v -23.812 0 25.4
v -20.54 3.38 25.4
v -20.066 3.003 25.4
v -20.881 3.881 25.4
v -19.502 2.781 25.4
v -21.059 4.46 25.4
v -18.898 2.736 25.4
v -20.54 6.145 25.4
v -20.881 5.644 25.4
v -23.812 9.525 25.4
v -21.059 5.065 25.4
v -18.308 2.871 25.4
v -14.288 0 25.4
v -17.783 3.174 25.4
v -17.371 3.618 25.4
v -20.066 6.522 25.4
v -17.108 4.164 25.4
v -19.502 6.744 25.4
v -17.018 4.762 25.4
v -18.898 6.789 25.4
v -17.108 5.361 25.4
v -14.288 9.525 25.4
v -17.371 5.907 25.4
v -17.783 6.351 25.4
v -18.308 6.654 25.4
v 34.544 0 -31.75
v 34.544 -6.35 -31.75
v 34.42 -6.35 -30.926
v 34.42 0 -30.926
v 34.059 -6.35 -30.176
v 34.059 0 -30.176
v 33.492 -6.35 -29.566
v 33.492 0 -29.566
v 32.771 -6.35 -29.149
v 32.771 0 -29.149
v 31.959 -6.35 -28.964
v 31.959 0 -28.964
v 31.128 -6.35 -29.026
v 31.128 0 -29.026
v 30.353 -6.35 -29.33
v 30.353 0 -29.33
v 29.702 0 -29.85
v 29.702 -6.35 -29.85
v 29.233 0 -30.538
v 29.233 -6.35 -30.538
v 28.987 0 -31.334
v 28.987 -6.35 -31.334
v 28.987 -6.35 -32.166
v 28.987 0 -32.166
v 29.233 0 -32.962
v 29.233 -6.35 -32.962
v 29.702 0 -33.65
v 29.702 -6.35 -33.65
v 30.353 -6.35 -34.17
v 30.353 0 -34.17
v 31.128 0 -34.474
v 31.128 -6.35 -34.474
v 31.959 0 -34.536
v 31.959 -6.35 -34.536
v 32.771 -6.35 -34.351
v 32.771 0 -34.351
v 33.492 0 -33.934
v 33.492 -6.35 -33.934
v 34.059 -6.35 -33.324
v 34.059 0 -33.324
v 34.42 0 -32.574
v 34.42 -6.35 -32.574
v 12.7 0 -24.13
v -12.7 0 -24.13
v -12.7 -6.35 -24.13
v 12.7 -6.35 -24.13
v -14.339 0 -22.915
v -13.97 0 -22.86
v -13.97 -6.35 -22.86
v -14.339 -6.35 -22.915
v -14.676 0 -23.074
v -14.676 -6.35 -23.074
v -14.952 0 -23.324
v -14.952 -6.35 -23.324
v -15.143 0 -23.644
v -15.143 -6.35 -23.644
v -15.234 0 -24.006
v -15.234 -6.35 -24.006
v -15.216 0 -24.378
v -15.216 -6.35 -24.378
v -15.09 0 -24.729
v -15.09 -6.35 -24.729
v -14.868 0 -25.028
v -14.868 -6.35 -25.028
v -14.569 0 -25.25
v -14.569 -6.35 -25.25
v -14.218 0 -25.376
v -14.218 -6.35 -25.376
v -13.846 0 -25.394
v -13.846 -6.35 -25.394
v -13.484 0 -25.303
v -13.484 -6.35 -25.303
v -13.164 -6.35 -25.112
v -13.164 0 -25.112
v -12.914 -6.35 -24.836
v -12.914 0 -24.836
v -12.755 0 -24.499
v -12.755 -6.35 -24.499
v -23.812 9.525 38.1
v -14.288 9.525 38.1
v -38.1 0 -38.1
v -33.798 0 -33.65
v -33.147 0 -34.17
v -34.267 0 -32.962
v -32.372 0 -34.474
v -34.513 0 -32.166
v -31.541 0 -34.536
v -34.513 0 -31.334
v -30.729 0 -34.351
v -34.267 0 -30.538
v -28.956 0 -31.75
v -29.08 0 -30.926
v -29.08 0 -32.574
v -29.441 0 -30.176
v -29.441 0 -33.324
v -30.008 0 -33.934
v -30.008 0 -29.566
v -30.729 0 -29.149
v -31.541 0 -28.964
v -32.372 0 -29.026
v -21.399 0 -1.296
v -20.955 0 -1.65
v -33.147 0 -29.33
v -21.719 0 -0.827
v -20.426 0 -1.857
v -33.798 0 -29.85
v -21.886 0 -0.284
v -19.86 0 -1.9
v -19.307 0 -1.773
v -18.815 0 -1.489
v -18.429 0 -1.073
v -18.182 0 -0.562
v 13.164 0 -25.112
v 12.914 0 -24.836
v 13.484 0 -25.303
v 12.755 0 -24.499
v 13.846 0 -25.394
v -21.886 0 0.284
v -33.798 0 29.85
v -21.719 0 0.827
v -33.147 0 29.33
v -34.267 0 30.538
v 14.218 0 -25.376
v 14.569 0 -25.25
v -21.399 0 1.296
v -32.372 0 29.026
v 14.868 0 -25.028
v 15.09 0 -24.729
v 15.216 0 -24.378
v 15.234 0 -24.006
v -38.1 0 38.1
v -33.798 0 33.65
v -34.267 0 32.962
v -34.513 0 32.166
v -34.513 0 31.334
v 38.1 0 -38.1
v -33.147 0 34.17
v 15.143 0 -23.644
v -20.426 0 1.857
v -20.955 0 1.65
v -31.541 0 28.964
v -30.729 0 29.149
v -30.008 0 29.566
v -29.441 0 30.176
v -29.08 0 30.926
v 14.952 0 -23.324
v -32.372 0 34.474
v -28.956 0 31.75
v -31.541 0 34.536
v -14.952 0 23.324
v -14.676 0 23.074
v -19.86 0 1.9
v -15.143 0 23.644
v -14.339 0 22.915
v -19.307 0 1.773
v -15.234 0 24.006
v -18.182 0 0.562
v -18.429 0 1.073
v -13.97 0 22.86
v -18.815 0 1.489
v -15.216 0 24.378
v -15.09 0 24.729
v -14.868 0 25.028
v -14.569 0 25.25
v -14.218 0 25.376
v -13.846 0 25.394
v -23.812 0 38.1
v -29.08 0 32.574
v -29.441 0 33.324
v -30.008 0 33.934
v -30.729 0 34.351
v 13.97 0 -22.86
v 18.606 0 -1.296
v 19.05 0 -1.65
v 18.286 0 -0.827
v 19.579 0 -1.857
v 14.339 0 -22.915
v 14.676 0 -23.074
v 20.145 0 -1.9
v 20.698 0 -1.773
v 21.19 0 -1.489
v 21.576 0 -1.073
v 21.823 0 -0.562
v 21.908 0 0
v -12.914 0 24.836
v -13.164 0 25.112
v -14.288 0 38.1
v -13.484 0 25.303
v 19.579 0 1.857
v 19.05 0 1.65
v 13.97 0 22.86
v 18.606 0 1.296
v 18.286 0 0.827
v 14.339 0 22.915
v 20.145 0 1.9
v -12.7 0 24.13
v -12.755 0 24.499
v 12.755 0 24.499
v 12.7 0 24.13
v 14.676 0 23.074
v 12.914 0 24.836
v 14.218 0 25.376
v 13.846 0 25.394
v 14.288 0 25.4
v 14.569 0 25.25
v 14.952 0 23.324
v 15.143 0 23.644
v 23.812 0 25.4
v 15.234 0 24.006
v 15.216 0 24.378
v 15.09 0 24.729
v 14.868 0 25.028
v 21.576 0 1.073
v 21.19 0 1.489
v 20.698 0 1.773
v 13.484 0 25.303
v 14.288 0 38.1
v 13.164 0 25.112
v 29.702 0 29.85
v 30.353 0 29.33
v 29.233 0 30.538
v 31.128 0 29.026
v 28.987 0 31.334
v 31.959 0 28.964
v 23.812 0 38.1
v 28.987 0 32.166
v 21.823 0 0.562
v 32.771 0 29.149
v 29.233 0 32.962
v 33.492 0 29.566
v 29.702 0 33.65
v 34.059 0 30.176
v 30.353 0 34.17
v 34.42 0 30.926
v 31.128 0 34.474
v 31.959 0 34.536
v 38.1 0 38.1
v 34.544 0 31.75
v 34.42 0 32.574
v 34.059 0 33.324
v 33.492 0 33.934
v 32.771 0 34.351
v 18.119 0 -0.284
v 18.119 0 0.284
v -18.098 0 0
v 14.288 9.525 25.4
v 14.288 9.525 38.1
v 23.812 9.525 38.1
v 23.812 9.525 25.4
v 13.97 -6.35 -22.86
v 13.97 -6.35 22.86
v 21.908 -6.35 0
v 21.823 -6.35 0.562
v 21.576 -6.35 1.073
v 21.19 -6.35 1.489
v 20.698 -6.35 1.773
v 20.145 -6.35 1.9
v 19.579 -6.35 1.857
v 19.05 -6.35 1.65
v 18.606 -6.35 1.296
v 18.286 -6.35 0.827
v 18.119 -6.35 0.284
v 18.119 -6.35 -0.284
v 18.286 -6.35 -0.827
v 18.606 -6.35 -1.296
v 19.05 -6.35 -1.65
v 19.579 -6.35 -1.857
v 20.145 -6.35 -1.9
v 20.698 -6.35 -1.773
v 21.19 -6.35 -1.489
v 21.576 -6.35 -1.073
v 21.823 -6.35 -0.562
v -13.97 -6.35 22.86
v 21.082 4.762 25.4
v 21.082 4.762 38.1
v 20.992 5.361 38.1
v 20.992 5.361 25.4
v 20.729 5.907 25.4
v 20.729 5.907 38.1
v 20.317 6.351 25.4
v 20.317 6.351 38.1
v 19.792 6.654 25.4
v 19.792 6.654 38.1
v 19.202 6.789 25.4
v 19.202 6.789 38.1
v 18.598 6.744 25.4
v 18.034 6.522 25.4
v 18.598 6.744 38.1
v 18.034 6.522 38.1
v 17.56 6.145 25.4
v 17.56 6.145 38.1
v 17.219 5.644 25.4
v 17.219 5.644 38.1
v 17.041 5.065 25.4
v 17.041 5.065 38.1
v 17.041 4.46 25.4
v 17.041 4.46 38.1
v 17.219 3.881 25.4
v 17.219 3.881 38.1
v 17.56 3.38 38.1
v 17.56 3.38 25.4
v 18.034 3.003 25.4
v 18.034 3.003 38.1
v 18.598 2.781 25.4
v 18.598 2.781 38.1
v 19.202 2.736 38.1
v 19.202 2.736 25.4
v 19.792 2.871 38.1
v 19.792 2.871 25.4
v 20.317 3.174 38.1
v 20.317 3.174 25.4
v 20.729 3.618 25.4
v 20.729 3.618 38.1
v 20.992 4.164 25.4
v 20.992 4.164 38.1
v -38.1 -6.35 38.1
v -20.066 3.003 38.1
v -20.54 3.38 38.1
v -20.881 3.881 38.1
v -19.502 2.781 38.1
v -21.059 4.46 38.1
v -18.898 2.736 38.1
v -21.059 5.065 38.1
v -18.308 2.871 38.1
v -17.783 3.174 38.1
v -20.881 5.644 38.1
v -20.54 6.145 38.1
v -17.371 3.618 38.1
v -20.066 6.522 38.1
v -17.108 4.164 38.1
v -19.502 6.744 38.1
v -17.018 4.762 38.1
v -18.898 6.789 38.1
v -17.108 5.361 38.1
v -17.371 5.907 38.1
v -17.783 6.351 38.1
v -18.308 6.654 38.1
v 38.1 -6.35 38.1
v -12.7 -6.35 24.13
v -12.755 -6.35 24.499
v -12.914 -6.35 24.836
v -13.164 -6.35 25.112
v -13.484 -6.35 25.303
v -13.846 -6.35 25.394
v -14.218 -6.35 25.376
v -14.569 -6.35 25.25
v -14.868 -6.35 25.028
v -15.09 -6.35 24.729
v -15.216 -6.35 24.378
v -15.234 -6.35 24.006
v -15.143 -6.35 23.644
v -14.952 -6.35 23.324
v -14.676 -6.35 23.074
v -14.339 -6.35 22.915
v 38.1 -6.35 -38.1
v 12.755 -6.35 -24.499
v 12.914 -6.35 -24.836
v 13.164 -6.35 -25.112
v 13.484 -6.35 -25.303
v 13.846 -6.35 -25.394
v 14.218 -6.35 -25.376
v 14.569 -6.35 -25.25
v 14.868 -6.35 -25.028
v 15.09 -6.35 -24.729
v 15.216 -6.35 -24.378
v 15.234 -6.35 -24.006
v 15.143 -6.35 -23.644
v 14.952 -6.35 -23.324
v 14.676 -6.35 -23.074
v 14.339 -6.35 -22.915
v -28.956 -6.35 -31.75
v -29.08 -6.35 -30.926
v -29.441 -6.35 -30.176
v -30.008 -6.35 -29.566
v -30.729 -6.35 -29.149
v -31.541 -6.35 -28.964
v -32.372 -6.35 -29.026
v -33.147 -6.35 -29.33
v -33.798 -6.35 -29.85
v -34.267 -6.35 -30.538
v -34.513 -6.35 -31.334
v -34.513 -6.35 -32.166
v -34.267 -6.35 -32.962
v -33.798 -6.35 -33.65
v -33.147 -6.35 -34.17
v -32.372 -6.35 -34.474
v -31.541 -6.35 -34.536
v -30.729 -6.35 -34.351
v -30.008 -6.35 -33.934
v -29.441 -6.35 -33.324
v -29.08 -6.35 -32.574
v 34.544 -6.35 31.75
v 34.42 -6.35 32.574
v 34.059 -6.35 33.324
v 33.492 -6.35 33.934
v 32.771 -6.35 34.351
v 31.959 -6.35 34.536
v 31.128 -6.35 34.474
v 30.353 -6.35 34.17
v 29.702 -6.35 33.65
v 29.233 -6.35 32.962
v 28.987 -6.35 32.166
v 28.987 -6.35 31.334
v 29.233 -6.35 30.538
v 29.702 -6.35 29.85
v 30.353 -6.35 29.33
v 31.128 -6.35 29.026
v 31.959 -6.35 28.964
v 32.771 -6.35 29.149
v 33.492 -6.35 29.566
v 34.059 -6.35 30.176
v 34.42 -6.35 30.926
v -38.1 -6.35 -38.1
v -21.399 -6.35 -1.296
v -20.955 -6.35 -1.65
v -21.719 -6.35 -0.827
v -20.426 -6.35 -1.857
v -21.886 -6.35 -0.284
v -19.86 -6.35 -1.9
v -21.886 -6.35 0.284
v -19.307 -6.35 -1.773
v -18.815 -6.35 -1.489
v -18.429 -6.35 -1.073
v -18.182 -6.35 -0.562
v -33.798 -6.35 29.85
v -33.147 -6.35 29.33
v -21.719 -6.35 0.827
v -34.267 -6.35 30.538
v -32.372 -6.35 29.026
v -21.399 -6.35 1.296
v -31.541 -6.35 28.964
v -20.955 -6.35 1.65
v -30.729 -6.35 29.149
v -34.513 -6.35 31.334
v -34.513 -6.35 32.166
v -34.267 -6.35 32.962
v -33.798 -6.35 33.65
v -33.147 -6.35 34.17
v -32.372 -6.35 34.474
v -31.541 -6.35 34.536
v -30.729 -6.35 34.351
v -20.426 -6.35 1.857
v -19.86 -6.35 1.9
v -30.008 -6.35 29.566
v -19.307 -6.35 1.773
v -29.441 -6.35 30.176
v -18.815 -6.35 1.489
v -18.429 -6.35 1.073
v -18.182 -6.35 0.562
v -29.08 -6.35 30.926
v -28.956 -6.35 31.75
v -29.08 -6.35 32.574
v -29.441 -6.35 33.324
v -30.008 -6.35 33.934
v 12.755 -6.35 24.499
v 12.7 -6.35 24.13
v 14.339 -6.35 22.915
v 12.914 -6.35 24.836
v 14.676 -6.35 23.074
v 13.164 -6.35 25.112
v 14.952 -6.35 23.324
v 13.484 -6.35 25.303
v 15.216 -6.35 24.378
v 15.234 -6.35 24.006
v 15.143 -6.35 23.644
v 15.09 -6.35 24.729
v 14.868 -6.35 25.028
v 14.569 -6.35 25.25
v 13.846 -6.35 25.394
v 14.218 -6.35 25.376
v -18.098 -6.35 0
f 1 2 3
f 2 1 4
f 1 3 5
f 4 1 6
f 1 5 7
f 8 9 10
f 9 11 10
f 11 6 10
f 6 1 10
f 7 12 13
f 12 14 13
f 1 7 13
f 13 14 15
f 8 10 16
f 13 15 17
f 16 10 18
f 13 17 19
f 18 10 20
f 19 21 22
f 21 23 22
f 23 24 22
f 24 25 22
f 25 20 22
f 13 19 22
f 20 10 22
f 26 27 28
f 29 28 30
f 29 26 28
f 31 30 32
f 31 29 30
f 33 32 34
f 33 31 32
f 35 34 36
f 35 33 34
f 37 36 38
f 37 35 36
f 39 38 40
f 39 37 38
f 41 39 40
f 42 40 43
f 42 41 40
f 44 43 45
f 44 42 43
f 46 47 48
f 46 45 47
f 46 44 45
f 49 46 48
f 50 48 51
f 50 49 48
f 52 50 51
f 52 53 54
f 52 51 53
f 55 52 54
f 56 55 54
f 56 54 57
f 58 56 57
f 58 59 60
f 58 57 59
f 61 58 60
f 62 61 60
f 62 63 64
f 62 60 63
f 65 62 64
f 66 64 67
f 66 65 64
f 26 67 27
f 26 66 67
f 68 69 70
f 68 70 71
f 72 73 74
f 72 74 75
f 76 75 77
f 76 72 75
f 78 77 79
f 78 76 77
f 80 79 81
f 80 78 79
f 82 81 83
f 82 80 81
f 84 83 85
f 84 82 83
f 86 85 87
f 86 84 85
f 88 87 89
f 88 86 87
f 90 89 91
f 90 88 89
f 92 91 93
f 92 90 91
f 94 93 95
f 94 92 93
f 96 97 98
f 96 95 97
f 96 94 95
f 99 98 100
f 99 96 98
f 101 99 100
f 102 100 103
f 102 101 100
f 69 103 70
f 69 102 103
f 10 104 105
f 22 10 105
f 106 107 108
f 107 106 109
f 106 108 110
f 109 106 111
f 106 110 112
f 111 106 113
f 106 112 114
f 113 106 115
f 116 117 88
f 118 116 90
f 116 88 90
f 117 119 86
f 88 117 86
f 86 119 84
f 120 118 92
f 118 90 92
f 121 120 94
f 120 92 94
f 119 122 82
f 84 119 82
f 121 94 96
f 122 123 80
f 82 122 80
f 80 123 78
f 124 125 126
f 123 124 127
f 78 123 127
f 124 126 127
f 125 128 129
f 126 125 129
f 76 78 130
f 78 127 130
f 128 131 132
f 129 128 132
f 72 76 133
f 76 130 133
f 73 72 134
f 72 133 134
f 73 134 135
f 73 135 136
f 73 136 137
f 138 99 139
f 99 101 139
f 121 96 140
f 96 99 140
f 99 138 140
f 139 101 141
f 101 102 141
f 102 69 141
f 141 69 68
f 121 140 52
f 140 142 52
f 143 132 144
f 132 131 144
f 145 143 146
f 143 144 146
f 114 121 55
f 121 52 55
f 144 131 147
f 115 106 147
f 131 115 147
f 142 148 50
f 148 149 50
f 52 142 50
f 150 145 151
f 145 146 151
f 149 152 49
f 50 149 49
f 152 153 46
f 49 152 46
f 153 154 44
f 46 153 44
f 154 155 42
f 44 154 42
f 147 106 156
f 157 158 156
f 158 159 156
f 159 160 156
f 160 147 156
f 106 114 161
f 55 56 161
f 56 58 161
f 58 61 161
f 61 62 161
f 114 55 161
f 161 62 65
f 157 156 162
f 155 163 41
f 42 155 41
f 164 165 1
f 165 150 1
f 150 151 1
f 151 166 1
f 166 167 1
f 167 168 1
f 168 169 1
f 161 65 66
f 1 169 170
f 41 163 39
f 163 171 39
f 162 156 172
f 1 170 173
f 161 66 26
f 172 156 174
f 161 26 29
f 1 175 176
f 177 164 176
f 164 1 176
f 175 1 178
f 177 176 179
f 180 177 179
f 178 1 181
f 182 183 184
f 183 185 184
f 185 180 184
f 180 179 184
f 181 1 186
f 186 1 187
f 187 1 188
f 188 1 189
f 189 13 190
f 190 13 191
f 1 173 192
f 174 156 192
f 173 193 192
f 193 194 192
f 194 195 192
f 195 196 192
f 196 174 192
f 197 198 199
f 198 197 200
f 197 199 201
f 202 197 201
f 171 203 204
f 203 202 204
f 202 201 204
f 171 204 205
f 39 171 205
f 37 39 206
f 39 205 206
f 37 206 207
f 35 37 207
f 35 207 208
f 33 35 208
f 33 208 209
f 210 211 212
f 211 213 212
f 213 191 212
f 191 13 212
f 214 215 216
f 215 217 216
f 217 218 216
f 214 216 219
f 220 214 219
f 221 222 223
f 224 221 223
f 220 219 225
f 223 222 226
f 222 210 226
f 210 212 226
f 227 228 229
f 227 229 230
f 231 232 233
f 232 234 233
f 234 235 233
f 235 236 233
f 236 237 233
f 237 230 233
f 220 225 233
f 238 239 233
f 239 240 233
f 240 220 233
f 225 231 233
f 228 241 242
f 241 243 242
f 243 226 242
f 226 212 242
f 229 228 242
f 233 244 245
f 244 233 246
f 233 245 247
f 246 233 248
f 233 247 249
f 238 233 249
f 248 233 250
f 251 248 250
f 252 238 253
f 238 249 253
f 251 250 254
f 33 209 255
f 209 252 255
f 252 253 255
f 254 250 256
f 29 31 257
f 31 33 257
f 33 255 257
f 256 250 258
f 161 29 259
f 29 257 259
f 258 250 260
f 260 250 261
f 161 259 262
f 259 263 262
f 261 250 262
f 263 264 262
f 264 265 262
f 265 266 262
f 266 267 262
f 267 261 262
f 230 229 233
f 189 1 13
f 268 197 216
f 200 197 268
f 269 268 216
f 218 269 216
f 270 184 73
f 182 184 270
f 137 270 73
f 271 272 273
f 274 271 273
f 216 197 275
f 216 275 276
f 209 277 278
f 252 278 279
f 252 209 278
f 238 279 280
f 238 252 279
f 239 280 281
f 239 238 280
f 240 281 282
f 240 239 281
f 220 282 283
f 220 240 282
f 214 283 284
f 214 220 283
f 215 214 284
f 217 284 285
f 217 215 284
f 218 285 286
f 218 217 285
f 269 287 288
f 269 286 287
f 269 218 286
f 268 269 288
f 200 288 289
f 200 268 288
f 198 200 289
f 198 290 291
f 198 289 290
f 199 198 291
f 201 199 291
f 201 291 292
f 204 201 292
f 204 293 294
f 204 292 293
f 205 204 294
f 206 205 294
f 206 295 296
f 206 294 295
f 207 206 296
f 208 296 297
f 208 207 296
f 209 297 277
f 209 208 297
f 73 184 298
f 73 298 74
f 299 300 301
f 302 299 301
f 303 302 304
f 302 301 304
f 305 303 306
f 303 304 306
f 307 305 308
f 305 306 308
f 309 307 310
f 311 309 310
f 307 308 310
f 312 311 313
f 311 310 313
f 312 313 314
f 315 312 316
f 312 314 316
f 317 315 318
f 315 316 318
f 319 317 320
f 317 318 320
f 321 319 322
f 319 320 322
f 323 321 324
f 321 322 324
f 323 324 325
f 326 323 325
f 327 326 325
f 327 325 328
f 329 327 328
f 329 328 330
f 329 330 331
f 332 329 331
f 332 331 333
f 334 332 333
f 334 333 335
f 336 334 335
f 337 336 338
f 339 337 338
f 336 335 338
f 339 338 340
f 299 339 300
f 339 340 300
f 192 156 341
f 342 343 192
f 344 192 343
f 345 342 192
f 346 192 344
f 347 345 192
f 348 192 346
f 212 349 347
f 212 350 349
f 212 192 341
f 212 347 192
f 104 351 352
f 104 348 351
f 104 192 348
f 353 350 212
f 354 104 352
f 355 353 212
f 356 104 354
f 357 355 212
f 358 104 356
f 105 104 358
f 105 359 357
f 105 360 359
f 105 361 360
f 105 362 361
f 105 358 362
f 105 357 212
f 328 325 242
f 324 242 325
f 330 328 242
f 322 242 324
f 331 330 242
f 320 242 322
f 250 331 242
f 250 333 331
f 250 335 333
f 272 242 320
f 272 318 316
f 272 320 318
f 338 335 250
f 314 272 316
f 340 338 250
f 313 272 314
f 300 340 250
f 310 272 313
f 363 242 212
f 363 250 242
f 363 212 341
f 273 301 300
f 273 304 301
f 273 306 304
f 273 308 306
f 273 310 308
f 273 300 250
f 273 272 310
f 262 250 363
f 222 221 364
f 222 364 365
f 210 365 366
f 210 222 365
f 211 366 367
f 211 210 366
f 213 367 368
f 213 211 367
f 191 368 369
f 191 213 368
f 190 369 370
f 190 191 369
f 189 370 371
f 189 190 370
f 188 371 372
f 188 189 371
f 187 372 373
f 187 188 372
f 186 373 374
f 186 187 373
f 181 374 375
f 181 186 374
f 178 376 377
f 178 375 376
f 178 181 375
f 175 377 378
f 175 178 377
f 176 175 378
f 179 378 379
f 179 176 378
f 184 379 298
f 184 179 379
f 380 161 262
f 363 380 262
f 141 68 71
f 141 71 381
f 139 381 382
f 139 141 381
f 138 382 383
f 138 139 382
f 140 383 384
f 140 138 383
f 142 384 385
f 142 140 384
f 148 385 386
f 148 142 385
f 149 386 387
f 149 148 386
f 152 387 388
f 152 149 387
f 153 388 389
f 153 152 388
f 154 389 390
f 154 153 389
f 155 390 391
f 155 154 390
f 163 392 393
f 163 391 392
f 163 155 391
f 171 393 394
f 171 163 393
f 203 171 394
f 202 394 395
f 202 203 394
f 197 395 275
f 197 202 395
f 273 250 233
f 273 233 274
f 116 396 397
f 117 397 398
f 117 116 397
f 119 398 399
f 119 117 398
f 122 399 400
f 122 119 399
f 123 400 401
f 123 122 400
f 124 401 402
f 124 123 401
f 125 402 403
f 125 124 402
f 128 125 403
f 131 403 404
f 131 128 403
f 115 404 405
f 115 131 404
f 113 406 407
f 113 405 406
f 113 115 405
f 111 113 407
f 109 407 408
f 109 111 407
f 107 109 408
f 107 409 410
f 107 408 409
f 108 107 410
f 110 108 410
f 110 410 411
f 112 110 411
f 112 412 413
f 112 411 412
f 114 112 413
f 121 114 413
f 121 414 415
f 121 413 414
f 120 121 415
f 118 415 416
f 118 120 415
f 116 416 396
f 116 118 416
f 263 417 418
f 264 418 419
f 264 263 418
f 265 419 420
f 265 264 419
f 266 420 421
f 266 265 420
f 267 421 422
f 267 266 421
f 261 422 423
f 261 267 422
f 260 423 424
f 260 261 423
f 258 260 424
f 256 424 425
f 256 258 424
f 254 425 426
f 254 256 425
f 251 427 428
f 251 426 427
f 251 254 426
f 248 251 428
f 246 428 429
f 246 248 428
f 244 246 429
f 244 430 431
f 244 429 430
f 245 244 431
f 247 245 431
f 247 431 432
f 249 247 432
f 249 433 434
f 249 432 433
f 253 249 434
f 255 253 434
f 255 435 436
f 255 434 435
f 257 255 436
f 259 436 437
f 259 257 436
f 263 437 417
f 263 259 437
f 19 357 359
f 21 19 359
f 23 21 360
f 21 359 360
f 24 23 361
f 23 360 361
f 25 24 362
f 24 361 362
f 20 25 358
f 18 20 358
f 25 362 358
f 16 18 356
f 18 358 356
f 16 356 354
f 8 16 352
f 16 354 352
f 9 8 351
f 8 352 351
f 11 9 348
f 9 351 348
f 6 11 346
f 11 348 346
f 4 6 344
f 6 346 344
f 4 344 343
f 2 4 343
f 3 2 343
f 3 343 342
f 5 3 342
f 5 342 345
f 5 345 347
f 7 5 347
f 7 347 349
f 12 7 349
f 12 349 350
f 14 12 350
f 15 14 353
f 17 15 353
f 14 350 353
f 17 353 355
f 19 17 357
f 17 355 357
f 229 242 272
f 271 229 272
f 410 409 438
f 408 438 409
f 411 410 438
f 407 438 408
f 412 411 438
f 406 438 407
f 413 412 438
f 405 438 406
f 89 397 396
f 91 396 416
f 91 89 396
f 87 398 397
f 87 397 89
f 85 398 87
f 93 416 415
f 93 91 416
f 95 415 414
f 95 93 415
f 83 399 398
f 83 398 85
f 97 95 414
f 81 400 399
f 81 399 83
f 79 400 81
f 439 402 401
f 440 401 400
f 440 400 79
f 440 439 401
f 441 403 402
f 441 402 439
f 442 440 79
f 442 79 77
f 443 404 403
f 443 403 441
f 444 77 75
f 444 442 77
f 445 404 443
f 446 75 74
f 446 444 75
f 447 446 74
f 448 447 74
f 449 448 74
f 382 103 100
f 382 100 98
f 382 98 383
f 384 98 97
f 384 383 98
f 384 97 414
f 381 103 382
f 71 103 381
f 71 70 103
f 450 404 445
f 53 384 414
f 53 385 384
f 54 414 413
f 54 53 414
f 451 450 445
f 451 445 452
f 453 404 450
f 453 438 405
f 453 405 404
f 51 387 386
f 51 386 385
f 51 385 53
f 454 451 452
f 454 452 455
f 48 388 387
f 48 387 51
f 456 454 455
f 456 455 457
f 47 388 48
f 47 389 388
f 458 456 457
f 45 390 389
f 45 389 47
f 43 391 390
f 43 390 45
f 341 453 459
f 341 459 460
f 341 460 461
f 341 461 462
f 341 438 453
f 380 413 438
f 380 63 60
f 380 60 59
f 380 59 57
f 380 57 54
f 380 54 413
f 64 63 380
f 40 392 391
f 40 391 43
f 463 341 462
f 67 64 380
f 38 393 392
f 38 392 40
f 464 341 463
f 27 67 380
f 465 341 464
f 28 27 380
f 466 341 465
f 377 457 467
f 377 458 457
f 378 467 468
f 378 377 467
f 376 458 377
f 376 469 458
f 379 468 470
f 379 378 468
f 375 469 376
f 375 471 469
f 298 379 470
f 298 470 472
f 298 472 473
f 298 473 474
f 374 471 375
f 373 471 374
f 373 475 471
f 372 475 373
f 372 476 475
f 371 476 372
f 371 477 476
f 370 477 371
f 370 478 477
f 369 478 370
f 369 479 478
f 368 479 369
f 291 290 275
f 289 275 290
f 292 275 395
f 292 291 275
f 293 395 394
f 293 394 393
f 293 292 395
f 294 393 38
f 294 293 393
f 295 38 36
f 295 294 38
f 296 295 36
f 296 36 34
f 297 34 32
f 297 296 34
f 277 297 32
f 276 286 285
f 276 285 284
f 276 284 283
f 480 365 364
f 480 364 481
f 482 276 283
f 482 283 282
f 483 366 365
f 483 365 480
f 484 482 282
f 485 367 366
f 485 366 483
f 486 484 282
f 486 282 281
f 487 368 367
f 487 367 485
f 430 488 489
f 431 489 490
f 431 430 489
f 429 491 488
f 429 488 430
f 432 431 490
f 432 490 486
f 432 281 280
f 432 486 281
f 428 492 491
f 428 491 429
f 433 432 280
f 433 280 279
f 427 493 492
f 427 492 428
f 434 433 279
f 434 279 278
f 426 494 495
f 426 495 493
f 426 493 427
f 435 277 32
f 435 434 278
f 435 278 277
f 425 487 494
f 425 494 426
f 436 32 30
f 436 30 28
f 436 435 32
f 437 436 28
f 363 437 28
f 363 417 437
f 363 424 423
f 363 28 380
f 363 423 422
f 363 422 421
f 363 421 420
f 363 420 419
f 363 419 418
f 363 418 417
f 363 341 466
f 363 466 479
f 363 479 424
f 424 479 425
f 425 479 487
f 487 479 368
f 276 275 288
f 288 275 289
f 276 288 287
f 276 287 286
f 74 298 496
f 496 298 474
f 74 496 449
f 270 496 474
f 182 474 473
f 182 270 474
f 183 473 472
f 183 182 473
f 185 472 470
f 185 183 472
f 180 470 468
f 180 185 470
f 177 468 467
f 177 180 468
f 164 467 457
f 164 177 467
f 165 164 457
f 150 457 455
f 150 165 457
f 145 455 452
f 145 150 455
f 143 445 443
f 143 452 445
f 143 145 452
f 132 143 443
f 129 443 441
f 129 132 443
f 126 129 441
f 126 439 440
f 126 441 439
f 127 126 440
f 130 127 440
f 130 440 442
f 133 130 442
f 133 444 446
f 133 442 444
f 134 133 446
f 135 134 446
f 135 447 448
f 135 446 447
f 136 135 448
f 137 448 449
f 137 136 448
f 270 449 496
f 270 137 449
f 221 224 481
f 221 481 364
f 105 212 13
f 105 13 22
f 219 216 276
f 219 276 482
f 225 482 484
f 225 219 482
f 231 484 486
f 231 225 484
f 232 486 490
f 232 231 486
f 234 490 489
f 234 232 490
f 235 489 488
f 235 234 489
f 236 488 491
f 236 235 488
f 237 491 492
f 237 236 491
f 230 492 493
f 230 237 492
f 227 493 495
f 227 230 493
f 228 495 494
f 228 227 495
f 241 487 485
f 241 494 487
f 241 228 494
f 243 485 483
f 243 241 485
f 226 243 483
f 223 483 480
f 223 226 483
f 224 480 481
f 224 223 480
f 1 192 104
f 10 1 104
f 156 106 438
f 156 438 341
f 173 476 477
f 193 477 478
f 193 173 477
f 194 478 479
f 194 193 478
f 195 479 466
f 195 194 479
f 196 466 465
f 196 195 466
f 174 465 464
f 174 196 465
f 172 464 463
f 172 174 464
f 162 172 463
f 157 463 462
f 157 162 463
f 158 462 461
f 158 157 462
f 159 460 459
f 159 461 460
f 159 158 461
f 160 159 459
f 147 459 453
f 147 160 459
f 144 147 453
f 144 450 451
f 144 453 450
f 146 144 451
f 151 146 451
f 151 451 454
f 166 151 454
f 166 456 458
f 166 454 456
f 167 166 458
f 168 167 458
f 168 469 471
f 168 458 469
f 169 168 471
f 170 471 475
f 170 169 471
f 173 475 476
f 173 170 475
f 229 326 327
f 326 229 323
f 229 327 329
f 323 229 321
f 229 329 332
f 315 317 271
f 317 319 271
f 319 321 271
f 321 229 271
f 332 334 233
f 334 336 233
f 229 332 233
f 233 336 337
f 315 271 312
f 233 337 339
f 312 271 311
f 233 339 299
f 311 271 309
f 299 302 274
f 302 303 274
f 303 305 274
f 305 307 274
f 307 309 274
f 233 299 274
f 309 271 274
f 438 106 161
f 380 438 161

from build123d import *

# Parameters (mm, degrees)
F0_W     = 76.2
F0_H     = 76.2
F3_DEPTH = 6.35
F4_DEPTH = 6.351
F2_R     = 2.794
F5_DEPTH = 6.351
F6_W     = 9.525
F6_H     = 9.525
F6_R     = 2.032
F7_DEPTH = 12.7
F8_R     = 1.905
F9_DEPTH = 6.351


with BuildPart() as f3:
    # F0 (on Front) → F3 (new body)
    with BuildSketch(Plane.XZ):
        Rectangle(F0_W, F0_H)
    extrude(amount=F3_DEPTH)

    # F1 (on Front) → F4 (cut, through all)
    with BuildSketch(Plane.XZ):
        with BuildLine():
            Line((12.7, 24.13), (-12.7, 24.13))
            ThreePointArc((-12.7, 24.13), (-14.868026, 25.028026), (-13.97, 22.86))
            Line((-13.97, 22.86), (-13.97, -22.86))
            ThreePointArc((-13.97, -22.86), (-14.868026, -25.028026), (-12.7, -24.13))
            Line((-12.7, -24.13), (12.7, -24.13))
            ThreePointArc((12.7, -24.13), (14.868026, -25.028026), (13.97, -22.86))
            Line((13.97, -22.86), (13.97, 22.86))
            ThreePointArc((13.97, 22.86), (14.868026, 25.028026), (12.7, 24.13))
        make_face()
    extrude(amount=F4_DEPTH, mode=Mode.SUBTRACT)

    # F2 (on Front) → F5 (cut, through all)
    with BuildSketch(Plane.XZ):
        with Locations((-31.75, 31.75)):
            Circle(F2_R)
        with Locations((-31.75, -31.75)):
            Circle(F2_R)
        with Locations((31.75, -31.75)):
            Circle(F2_R)
        with Locations((31.75, 31.75)):
            Circle(F2_R)
    extrude(amount=F5_DEPTH, mode=Mode.SUBTRACT)

    # F6 (on face) → F7 (join)
    with BuildSketch(Plane.XY.offset(38.1)):
        with Locations((-19.05, 4.7625)):
            Rectangle(F6_W, F6_H)
        with Locations((-19.05, 4.7625)):
            Circle(F6_R, mode=Mode.SUBTRACT)
        with Locations((19.05, 4.7625)):
            Rectangle(F6_W, F6_H)
        with Locations((19.05, 4.7625)):
            Circle(F6_R, mode=Mode.SUBTRACT)
    extrude(amount=-F7_DEPTH)

    # F8 (on Front) → F9 (cut, through all)
    with BuildSketch(Plane.XZ):
        with Locations((-20.0025, 0)):
            Circle(F8_R)
        with Locations((20.0025, 0)):
            Circle(F8_R)
    extrude(amount=F9_DEPTH, mode=Mode.SUBTRACT)


solid = f3.part
